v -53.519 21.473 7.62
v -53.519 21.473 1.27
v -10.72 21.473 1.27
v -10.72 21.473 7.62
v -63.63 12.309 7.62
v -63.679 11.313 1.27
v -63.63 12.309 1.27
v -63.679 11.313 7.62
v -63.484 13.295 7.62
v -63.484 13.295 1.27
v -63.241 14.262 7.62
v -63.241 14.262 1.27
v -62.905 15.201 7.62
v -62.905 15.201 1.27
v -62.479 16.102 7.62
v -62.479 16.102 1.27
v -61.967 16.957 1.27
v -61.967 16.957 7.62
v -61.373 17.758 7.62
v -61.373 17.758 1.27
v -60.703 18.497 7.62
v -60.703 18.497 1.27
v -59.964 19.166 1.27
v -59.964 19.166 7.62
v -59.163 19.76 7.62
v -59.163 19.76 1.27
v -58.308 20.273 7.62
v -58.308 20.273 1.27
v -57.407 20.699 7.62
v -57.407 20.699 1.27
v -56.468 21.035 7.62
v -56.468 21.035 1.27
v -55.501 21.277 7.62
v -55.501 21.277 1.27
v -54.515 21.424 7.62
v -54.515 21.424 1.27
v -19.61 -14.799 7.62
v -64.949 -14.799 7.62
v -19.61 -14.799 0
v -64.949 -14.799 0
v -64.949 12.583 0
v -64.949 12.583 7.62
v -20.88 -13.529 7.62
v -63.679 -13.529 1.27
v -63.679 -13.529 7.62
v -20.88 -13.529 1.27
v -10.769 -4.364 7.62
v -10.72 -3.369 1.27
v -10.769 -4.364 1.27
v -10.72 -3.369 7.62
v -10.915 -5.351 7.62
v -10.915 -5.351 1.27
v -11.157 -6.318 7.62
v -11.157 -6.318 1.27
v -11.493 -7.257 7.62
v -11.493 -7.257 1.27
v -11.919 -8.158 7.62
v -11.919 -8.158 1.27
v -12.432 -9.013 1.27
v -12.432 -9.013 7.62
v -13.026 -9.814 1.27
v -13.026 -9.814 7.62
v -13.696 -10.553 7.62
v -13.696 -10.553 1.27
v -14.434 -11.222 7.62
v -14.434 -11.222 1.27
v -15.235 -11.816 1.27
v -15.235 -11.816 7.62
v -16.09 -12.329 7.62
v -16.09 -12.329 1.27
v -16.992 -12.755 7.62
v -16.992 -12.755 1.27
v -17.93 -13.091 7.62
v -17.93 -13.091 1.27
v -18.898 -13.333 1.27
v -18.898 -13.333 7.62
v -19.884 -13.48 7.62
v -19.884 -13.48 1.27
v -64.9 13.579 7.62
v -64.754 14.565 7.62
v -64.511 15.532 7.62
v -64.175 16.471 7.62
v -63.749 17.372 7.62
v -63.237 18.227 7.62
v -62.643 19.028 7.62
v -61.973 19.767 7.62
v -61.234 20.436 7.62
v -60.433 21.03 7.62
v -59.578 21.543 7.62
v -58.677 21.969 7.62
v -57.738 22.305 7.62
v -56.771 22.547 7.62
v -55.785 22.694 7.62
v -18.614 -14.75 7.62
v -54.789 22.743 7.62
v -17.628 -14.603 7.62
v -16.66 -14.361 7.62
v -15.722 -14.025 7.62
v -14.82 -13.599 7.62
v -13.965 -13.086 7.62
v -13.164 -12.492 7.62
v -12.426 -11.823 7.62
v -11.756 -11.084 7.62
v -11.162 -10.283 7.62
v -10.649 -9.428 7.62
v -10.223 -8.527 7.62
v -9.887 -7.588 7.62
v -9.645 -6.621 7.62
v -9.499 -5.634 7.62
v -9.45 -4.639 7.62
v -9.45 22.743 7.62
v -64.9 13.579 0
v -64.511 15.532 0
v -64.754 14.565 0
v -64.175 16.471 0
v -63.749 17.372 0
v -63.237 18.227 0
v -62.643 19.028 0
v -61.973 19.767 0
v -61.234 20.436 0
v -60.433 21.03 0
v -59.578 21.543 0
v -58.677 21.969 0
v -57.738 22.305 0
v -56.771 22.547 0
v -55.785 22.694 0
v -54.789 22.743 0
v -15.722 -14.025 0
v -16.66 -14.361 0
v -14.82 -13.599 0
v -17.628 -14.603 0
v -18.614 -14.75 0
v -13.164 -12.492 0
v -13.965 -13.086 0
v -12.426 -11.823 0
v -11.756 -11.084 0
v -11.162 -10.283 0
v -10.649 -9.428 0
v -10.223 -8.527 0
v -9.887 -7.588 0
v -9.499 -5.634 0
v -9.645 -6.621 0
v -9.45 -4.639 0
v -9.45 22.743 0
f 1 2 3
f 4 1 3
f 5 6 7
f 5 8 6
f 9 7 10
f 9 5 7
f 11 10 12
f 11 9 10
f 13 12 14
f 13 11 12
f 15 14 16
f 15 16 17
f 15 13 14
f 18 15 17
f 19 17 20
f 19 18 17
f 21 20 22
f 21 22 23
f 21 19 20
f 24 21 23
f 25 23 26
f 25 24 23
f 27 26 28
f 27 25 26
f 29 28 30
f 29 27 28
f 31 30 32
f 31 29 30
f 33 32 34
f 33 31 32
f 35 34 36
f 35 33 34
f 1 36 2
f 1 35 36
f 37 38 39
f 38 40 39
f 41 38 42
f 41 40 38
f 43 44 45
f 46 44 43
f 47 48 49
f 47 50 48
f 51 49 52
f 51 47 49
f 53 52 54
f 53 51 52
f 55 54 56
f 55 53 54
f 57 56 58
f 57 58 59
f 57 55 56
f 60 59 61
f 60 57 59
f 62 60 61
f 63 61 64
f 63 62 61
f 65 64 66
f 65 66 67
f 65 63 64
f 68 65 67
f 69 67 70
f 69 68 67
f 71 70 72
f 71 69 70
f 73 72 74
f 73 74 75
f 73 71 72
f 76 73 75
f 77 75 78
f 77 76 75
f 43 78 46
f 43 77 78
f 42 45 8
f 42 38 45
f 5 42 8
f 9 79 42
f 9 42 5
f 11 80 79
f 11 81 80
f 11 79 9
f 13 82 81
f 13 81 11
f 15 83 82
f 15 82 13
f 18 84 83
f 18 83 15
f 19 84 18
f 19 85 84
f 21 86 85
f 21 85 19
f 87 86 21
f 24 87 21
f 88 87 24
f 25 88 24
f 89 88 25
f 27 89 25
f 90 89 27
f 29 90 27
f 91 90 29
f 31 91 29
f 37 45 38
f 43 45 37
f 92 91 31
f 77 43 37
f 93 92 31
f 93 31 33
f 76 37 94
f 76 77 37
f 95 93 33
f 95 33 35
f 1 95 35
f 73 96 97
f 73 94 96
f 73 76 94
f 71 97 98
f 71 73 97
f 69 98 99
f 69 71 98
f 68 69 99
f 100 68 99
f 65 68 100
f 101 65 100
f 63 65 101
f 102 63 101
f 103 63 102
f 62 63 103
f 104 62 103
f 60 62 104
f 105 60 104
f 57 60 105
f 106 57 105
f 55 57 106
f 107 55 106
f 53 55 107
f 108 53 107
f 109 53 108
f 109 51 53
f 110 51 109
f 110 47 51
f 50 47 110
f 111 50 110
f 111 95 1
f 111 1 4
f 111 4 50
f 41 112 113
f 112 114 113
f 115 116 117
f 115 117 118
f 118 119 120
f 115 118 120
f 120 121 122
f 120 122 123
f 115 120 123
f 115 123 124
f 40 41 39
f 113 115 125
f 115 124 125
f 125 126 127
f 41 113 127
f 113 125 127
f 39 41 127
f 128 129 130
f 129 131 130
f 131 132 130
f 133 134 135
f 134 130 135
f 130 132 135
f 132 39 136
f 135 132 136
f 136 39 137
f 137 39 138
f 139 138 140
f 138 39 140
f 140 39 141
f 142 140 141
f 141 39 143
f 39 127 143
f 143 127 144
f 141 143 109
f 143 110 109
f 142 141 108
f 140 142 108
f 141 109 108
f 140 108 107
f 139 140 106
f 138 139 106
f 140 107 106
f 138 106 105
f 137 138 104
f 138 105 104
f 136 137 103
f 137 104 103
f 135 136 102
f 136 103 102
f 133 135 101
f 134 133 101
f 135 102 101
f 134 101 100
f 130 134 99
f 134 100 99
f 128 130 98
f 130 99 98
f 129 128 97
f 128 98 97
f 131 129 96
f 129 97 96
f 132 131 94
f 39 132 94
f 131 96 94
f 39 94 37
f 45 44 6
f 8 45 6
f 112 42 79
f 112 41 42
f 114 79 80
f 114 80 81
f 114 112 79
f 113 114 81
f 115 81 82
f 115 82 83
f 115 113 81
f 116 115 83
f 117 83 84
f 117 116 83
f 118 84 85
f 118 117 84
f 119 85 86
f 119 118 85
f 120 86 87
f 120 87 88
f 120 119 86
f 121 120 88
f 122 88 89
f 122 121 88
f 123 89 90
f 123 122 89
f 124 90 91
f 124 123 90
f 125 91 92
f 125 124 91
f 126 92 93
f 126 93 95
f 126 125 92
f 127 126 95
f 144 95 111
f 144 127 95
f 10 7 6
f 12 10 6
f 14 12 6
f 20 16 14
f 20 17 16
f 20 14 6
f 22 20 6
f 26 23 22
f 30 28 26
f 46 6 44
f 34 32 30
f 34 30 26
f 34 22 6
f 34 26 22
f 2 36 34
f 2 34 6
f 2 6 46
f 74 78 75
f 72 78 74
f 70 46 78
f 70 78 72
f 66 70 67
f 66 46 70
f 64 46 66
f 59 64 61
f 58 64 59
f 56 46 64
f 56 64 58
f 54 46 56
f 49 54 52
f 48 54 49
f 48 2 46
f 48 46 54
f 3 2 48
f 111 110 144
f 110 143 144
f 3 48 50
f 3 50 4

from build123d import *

# Parameters (mm, degrees)
F0_W     = 55.499
F0_H     = 37.5412
F0_W_2   = 52.959
F0_H_2   = 35.0012
F1_DEPTH = 1.27
F2_DEPTH = 7.62
F3_R     = 10.16


with BuildPart() as f1:
    # F0 (on Top) → F1 (new body)
    with BuildSketch(Plane.XY):
        with Locations((-37.199277, 3.972059)):
            Rectangle(F0_W, F0_H)
        with Locations((-37.199277, 3.972059)):
            Rectangle(F0_W_2, F0_H_2, mode=Mode.SUBTRACT)
        with Locations((-37.199277, 3.972059)):
            Rectangle(F0_W_2, F0_H_2)
    extrude(amount=F1_DEPTH)

    # F0 (on Top) → F2 (join)
    with BuildSketch(Plane.XY):
        with Locations((-37.199277, 3.972059)):
            Rectangle(F0_W, F0_H)
        with Locations((-37.199277, 3.972059)):
            Rectangle(F0_W_2, F0_H_2, mode=Mode.SUBTRACT)
    extrude(amount=F2_DEPTH)

    # F3
    f3_edges = [f1.edges().sort_by_distance(p)[0] for p in [
        (-64.948777, 22.742659, 3.81),
        (-63.678777, 21.472659, 4.445),
        (-10.719777, -13.528541, 4.445),
        (-9.449777, -14.798541, 3.81),
    ]]
    fillet(f3_edges, radius=F3_R)


solid = f1.part
